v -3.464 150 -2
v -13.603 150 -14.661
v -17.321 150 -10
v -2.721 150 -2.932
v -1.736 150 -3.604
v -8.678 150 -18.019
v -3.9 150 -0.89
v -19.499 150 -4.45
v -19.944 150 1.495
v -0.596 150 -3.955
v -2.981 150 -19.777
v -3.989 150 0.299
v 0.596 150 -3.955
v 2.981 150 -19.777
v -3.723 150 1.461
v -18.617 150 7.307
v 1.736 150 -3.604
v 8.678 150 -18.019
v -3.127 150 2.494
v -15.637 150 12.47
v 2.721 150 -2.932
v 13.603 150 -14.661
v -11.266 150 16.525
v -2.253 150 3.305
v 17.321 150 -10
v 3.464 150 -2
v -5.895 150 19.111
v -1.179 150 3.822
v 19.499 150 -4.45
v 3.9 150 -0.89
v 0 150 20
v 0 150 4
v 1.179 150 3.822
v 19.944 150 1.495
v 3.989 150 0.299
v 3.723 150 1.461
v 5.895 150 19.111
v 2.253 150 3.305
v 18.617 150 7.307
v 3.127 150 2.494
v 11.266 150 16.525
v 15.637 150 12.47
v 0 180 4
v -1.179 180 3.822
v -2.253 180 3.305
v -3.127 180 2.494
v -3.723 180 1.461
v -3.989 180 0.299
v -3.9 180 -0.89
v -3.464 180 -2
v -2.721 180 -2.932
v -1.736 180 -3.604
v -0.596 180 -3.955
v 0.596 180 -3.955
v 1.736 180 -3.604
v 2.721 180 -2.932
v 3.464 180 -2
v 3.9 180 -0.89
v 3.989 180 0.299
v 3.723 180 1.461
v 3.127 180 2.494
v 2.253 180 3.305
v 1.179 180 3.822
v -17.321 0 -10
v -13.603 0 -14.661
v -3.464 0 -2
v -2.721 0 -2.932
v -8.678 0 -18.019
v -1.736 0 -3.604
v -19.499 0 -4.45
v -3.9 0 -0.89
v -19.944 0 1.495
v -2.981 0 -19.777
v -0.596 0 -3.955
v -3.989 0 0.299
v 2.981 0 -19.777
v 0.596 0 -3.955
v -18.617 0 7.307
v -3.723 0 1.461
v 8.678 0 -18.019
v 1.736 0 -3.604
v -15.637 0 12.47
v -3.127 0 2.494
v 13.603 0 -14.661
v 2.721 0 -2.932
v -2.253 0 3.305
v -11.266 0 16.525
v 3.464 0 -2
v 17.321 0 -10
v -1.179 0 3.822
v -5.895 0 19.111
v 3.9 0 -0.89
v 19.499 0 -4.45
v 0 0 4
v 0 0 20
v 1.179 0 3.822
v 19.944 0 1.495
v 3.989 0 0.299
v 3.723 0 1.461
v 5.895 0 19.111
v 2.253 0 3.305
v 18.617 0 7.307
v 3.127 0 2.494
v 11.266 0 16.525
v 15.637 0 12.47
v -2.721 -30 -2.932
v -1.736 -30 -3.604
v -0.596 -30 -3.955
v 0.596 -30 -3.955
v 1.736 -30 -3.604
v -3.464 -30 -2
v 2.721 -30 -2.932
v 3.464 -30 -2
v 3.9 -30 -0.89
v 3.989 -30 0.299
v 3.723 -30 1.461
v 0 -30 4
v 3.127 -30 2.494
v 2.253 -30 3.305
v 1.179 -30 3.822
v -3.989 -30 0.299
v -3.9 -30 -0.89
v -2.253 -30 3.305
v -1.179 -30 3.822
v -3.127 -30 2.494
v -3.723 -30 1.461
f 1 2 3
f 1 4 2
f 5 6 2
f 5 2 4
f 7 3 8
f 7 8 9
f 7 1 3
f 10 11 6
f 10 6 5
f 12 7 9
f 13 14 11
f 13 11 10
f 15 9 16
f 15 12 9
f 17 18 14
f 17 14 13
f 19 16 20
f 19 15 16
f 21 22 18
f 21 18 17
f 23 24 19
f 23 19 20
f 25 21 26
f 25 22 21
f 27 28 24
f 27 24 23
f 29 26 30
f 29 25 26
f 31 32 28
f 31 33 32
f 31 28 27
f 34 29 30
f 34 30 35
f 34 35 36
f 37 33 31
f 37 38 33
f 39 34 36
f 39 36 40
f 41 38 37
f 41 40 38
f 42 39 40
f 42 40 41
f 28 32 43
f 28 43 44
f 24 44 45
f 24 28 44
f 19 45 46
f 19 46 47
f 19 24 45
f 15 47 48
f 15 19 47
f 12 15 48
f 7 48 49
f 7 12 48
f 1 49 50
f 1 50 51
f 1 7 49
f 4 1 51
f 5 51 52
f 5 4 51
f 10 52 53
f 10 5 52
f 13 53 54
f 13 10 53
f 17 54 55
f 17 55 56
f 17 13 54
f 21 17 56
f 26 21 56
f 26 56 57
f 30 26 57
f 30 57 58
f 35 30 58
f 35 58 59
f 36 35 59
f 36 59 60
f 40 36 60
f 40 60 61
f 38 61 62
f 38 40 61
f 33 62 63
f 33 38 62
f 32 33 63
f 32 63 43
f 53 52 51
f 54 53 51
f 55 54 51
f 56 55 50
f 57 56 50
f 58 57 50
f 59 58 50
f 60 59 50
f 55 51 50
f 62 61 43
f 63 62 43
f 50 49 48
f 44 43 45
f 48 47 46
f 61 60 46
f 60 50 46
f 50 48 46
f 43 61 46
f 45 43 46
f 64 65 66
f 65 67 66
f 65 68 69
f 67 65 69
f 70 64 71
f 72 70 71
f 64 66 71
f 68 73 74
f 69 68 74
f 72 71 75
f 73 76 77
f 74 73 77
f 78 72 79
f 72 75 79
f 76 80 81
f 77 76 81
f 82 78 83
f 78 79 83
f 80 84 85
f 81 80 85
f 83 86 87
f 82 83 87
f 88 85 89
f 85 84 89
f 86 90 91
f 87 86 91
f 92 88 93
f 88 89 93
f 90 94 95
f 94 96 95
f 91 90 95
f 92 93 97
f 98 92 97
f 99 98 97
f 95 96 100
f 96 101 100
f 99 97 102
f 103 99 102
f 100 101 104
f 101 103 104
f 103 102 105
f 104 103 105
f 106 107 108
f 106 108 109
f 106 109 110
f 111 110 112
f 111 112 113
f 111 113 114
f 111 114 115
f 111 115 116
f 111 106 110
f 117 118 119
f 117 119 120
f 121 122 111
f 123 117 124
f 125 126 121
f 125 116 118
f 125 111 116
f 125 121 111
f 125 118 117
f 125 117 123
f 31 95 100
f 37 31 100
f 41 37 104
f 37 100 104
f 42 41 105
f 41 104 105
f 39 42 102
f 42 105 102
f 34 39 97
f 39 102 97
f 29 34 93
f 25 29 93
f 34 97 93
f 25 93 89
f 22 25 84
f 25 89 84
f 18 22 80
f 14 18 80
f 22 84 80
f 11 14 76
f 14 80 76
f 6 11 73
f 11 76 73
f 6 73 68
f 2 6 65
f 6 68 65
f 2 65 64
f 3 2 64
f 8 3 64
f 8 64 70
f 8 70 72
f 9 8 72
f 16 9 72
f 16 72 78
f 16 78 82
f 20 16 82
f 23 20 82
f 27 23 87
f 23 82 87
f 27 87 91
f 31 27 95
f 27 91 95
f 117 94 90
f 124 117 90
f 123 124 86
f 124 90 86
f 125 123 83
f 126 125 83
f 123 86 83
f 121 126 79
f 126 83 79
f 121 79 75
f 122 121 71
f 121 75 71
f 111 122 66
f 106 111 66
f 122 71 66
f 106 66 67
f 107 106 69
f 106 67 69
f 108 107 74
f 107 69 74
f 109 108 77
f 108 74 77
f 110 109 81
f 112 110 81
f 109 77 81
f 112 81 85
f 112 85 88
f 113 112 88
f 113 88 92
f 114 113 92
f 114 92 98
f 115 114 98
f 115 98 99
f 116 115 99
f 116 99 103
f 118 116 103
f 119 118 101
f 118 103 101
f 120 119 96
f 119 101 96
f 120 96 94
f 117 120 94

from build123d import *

# Parameters (mm, degrees)
SKETCH1_R           = 20
BOSS_EXTRUDE1_DEPTH = 150
SKETCH2_R           = 4
BOSS_EXTRUDE2_DEPTH = 30


with BuildPart() as part:
    # Sketch1 → Boss-Extrude1 (new body)
    with BuildSketch(Plane(origin=(0, 0, 0), x_dir=(1, 0, 0), z_dir=(0, 1, 0))):
        with Locations(Location((0, 0, 0), (0, 0, 270))):
            Circle(SKETCH1_R)
    extrude(amount=BOSS_EXTRUDE1_DEPTH)

    # Sketch2 → Boss-Extrude2 (add)
    with BuildSketch(Plane.XZ):
        with Locations(Location((0, 0, 0), (0, 0, 90))):
            Circle(SKETCH2_R)
    boss_extrude2 = extrude(amount=BOSS_EXTRUDE2_DEPTH)

    # Mirror1: Boss-Extrude2 across plane
    add(boss_extrude2.mirror(Plane(origin=(0, 75, 0), x_dir=(0, 0, 1), z_dir=(0, -1, 0))))


solid = part.part
